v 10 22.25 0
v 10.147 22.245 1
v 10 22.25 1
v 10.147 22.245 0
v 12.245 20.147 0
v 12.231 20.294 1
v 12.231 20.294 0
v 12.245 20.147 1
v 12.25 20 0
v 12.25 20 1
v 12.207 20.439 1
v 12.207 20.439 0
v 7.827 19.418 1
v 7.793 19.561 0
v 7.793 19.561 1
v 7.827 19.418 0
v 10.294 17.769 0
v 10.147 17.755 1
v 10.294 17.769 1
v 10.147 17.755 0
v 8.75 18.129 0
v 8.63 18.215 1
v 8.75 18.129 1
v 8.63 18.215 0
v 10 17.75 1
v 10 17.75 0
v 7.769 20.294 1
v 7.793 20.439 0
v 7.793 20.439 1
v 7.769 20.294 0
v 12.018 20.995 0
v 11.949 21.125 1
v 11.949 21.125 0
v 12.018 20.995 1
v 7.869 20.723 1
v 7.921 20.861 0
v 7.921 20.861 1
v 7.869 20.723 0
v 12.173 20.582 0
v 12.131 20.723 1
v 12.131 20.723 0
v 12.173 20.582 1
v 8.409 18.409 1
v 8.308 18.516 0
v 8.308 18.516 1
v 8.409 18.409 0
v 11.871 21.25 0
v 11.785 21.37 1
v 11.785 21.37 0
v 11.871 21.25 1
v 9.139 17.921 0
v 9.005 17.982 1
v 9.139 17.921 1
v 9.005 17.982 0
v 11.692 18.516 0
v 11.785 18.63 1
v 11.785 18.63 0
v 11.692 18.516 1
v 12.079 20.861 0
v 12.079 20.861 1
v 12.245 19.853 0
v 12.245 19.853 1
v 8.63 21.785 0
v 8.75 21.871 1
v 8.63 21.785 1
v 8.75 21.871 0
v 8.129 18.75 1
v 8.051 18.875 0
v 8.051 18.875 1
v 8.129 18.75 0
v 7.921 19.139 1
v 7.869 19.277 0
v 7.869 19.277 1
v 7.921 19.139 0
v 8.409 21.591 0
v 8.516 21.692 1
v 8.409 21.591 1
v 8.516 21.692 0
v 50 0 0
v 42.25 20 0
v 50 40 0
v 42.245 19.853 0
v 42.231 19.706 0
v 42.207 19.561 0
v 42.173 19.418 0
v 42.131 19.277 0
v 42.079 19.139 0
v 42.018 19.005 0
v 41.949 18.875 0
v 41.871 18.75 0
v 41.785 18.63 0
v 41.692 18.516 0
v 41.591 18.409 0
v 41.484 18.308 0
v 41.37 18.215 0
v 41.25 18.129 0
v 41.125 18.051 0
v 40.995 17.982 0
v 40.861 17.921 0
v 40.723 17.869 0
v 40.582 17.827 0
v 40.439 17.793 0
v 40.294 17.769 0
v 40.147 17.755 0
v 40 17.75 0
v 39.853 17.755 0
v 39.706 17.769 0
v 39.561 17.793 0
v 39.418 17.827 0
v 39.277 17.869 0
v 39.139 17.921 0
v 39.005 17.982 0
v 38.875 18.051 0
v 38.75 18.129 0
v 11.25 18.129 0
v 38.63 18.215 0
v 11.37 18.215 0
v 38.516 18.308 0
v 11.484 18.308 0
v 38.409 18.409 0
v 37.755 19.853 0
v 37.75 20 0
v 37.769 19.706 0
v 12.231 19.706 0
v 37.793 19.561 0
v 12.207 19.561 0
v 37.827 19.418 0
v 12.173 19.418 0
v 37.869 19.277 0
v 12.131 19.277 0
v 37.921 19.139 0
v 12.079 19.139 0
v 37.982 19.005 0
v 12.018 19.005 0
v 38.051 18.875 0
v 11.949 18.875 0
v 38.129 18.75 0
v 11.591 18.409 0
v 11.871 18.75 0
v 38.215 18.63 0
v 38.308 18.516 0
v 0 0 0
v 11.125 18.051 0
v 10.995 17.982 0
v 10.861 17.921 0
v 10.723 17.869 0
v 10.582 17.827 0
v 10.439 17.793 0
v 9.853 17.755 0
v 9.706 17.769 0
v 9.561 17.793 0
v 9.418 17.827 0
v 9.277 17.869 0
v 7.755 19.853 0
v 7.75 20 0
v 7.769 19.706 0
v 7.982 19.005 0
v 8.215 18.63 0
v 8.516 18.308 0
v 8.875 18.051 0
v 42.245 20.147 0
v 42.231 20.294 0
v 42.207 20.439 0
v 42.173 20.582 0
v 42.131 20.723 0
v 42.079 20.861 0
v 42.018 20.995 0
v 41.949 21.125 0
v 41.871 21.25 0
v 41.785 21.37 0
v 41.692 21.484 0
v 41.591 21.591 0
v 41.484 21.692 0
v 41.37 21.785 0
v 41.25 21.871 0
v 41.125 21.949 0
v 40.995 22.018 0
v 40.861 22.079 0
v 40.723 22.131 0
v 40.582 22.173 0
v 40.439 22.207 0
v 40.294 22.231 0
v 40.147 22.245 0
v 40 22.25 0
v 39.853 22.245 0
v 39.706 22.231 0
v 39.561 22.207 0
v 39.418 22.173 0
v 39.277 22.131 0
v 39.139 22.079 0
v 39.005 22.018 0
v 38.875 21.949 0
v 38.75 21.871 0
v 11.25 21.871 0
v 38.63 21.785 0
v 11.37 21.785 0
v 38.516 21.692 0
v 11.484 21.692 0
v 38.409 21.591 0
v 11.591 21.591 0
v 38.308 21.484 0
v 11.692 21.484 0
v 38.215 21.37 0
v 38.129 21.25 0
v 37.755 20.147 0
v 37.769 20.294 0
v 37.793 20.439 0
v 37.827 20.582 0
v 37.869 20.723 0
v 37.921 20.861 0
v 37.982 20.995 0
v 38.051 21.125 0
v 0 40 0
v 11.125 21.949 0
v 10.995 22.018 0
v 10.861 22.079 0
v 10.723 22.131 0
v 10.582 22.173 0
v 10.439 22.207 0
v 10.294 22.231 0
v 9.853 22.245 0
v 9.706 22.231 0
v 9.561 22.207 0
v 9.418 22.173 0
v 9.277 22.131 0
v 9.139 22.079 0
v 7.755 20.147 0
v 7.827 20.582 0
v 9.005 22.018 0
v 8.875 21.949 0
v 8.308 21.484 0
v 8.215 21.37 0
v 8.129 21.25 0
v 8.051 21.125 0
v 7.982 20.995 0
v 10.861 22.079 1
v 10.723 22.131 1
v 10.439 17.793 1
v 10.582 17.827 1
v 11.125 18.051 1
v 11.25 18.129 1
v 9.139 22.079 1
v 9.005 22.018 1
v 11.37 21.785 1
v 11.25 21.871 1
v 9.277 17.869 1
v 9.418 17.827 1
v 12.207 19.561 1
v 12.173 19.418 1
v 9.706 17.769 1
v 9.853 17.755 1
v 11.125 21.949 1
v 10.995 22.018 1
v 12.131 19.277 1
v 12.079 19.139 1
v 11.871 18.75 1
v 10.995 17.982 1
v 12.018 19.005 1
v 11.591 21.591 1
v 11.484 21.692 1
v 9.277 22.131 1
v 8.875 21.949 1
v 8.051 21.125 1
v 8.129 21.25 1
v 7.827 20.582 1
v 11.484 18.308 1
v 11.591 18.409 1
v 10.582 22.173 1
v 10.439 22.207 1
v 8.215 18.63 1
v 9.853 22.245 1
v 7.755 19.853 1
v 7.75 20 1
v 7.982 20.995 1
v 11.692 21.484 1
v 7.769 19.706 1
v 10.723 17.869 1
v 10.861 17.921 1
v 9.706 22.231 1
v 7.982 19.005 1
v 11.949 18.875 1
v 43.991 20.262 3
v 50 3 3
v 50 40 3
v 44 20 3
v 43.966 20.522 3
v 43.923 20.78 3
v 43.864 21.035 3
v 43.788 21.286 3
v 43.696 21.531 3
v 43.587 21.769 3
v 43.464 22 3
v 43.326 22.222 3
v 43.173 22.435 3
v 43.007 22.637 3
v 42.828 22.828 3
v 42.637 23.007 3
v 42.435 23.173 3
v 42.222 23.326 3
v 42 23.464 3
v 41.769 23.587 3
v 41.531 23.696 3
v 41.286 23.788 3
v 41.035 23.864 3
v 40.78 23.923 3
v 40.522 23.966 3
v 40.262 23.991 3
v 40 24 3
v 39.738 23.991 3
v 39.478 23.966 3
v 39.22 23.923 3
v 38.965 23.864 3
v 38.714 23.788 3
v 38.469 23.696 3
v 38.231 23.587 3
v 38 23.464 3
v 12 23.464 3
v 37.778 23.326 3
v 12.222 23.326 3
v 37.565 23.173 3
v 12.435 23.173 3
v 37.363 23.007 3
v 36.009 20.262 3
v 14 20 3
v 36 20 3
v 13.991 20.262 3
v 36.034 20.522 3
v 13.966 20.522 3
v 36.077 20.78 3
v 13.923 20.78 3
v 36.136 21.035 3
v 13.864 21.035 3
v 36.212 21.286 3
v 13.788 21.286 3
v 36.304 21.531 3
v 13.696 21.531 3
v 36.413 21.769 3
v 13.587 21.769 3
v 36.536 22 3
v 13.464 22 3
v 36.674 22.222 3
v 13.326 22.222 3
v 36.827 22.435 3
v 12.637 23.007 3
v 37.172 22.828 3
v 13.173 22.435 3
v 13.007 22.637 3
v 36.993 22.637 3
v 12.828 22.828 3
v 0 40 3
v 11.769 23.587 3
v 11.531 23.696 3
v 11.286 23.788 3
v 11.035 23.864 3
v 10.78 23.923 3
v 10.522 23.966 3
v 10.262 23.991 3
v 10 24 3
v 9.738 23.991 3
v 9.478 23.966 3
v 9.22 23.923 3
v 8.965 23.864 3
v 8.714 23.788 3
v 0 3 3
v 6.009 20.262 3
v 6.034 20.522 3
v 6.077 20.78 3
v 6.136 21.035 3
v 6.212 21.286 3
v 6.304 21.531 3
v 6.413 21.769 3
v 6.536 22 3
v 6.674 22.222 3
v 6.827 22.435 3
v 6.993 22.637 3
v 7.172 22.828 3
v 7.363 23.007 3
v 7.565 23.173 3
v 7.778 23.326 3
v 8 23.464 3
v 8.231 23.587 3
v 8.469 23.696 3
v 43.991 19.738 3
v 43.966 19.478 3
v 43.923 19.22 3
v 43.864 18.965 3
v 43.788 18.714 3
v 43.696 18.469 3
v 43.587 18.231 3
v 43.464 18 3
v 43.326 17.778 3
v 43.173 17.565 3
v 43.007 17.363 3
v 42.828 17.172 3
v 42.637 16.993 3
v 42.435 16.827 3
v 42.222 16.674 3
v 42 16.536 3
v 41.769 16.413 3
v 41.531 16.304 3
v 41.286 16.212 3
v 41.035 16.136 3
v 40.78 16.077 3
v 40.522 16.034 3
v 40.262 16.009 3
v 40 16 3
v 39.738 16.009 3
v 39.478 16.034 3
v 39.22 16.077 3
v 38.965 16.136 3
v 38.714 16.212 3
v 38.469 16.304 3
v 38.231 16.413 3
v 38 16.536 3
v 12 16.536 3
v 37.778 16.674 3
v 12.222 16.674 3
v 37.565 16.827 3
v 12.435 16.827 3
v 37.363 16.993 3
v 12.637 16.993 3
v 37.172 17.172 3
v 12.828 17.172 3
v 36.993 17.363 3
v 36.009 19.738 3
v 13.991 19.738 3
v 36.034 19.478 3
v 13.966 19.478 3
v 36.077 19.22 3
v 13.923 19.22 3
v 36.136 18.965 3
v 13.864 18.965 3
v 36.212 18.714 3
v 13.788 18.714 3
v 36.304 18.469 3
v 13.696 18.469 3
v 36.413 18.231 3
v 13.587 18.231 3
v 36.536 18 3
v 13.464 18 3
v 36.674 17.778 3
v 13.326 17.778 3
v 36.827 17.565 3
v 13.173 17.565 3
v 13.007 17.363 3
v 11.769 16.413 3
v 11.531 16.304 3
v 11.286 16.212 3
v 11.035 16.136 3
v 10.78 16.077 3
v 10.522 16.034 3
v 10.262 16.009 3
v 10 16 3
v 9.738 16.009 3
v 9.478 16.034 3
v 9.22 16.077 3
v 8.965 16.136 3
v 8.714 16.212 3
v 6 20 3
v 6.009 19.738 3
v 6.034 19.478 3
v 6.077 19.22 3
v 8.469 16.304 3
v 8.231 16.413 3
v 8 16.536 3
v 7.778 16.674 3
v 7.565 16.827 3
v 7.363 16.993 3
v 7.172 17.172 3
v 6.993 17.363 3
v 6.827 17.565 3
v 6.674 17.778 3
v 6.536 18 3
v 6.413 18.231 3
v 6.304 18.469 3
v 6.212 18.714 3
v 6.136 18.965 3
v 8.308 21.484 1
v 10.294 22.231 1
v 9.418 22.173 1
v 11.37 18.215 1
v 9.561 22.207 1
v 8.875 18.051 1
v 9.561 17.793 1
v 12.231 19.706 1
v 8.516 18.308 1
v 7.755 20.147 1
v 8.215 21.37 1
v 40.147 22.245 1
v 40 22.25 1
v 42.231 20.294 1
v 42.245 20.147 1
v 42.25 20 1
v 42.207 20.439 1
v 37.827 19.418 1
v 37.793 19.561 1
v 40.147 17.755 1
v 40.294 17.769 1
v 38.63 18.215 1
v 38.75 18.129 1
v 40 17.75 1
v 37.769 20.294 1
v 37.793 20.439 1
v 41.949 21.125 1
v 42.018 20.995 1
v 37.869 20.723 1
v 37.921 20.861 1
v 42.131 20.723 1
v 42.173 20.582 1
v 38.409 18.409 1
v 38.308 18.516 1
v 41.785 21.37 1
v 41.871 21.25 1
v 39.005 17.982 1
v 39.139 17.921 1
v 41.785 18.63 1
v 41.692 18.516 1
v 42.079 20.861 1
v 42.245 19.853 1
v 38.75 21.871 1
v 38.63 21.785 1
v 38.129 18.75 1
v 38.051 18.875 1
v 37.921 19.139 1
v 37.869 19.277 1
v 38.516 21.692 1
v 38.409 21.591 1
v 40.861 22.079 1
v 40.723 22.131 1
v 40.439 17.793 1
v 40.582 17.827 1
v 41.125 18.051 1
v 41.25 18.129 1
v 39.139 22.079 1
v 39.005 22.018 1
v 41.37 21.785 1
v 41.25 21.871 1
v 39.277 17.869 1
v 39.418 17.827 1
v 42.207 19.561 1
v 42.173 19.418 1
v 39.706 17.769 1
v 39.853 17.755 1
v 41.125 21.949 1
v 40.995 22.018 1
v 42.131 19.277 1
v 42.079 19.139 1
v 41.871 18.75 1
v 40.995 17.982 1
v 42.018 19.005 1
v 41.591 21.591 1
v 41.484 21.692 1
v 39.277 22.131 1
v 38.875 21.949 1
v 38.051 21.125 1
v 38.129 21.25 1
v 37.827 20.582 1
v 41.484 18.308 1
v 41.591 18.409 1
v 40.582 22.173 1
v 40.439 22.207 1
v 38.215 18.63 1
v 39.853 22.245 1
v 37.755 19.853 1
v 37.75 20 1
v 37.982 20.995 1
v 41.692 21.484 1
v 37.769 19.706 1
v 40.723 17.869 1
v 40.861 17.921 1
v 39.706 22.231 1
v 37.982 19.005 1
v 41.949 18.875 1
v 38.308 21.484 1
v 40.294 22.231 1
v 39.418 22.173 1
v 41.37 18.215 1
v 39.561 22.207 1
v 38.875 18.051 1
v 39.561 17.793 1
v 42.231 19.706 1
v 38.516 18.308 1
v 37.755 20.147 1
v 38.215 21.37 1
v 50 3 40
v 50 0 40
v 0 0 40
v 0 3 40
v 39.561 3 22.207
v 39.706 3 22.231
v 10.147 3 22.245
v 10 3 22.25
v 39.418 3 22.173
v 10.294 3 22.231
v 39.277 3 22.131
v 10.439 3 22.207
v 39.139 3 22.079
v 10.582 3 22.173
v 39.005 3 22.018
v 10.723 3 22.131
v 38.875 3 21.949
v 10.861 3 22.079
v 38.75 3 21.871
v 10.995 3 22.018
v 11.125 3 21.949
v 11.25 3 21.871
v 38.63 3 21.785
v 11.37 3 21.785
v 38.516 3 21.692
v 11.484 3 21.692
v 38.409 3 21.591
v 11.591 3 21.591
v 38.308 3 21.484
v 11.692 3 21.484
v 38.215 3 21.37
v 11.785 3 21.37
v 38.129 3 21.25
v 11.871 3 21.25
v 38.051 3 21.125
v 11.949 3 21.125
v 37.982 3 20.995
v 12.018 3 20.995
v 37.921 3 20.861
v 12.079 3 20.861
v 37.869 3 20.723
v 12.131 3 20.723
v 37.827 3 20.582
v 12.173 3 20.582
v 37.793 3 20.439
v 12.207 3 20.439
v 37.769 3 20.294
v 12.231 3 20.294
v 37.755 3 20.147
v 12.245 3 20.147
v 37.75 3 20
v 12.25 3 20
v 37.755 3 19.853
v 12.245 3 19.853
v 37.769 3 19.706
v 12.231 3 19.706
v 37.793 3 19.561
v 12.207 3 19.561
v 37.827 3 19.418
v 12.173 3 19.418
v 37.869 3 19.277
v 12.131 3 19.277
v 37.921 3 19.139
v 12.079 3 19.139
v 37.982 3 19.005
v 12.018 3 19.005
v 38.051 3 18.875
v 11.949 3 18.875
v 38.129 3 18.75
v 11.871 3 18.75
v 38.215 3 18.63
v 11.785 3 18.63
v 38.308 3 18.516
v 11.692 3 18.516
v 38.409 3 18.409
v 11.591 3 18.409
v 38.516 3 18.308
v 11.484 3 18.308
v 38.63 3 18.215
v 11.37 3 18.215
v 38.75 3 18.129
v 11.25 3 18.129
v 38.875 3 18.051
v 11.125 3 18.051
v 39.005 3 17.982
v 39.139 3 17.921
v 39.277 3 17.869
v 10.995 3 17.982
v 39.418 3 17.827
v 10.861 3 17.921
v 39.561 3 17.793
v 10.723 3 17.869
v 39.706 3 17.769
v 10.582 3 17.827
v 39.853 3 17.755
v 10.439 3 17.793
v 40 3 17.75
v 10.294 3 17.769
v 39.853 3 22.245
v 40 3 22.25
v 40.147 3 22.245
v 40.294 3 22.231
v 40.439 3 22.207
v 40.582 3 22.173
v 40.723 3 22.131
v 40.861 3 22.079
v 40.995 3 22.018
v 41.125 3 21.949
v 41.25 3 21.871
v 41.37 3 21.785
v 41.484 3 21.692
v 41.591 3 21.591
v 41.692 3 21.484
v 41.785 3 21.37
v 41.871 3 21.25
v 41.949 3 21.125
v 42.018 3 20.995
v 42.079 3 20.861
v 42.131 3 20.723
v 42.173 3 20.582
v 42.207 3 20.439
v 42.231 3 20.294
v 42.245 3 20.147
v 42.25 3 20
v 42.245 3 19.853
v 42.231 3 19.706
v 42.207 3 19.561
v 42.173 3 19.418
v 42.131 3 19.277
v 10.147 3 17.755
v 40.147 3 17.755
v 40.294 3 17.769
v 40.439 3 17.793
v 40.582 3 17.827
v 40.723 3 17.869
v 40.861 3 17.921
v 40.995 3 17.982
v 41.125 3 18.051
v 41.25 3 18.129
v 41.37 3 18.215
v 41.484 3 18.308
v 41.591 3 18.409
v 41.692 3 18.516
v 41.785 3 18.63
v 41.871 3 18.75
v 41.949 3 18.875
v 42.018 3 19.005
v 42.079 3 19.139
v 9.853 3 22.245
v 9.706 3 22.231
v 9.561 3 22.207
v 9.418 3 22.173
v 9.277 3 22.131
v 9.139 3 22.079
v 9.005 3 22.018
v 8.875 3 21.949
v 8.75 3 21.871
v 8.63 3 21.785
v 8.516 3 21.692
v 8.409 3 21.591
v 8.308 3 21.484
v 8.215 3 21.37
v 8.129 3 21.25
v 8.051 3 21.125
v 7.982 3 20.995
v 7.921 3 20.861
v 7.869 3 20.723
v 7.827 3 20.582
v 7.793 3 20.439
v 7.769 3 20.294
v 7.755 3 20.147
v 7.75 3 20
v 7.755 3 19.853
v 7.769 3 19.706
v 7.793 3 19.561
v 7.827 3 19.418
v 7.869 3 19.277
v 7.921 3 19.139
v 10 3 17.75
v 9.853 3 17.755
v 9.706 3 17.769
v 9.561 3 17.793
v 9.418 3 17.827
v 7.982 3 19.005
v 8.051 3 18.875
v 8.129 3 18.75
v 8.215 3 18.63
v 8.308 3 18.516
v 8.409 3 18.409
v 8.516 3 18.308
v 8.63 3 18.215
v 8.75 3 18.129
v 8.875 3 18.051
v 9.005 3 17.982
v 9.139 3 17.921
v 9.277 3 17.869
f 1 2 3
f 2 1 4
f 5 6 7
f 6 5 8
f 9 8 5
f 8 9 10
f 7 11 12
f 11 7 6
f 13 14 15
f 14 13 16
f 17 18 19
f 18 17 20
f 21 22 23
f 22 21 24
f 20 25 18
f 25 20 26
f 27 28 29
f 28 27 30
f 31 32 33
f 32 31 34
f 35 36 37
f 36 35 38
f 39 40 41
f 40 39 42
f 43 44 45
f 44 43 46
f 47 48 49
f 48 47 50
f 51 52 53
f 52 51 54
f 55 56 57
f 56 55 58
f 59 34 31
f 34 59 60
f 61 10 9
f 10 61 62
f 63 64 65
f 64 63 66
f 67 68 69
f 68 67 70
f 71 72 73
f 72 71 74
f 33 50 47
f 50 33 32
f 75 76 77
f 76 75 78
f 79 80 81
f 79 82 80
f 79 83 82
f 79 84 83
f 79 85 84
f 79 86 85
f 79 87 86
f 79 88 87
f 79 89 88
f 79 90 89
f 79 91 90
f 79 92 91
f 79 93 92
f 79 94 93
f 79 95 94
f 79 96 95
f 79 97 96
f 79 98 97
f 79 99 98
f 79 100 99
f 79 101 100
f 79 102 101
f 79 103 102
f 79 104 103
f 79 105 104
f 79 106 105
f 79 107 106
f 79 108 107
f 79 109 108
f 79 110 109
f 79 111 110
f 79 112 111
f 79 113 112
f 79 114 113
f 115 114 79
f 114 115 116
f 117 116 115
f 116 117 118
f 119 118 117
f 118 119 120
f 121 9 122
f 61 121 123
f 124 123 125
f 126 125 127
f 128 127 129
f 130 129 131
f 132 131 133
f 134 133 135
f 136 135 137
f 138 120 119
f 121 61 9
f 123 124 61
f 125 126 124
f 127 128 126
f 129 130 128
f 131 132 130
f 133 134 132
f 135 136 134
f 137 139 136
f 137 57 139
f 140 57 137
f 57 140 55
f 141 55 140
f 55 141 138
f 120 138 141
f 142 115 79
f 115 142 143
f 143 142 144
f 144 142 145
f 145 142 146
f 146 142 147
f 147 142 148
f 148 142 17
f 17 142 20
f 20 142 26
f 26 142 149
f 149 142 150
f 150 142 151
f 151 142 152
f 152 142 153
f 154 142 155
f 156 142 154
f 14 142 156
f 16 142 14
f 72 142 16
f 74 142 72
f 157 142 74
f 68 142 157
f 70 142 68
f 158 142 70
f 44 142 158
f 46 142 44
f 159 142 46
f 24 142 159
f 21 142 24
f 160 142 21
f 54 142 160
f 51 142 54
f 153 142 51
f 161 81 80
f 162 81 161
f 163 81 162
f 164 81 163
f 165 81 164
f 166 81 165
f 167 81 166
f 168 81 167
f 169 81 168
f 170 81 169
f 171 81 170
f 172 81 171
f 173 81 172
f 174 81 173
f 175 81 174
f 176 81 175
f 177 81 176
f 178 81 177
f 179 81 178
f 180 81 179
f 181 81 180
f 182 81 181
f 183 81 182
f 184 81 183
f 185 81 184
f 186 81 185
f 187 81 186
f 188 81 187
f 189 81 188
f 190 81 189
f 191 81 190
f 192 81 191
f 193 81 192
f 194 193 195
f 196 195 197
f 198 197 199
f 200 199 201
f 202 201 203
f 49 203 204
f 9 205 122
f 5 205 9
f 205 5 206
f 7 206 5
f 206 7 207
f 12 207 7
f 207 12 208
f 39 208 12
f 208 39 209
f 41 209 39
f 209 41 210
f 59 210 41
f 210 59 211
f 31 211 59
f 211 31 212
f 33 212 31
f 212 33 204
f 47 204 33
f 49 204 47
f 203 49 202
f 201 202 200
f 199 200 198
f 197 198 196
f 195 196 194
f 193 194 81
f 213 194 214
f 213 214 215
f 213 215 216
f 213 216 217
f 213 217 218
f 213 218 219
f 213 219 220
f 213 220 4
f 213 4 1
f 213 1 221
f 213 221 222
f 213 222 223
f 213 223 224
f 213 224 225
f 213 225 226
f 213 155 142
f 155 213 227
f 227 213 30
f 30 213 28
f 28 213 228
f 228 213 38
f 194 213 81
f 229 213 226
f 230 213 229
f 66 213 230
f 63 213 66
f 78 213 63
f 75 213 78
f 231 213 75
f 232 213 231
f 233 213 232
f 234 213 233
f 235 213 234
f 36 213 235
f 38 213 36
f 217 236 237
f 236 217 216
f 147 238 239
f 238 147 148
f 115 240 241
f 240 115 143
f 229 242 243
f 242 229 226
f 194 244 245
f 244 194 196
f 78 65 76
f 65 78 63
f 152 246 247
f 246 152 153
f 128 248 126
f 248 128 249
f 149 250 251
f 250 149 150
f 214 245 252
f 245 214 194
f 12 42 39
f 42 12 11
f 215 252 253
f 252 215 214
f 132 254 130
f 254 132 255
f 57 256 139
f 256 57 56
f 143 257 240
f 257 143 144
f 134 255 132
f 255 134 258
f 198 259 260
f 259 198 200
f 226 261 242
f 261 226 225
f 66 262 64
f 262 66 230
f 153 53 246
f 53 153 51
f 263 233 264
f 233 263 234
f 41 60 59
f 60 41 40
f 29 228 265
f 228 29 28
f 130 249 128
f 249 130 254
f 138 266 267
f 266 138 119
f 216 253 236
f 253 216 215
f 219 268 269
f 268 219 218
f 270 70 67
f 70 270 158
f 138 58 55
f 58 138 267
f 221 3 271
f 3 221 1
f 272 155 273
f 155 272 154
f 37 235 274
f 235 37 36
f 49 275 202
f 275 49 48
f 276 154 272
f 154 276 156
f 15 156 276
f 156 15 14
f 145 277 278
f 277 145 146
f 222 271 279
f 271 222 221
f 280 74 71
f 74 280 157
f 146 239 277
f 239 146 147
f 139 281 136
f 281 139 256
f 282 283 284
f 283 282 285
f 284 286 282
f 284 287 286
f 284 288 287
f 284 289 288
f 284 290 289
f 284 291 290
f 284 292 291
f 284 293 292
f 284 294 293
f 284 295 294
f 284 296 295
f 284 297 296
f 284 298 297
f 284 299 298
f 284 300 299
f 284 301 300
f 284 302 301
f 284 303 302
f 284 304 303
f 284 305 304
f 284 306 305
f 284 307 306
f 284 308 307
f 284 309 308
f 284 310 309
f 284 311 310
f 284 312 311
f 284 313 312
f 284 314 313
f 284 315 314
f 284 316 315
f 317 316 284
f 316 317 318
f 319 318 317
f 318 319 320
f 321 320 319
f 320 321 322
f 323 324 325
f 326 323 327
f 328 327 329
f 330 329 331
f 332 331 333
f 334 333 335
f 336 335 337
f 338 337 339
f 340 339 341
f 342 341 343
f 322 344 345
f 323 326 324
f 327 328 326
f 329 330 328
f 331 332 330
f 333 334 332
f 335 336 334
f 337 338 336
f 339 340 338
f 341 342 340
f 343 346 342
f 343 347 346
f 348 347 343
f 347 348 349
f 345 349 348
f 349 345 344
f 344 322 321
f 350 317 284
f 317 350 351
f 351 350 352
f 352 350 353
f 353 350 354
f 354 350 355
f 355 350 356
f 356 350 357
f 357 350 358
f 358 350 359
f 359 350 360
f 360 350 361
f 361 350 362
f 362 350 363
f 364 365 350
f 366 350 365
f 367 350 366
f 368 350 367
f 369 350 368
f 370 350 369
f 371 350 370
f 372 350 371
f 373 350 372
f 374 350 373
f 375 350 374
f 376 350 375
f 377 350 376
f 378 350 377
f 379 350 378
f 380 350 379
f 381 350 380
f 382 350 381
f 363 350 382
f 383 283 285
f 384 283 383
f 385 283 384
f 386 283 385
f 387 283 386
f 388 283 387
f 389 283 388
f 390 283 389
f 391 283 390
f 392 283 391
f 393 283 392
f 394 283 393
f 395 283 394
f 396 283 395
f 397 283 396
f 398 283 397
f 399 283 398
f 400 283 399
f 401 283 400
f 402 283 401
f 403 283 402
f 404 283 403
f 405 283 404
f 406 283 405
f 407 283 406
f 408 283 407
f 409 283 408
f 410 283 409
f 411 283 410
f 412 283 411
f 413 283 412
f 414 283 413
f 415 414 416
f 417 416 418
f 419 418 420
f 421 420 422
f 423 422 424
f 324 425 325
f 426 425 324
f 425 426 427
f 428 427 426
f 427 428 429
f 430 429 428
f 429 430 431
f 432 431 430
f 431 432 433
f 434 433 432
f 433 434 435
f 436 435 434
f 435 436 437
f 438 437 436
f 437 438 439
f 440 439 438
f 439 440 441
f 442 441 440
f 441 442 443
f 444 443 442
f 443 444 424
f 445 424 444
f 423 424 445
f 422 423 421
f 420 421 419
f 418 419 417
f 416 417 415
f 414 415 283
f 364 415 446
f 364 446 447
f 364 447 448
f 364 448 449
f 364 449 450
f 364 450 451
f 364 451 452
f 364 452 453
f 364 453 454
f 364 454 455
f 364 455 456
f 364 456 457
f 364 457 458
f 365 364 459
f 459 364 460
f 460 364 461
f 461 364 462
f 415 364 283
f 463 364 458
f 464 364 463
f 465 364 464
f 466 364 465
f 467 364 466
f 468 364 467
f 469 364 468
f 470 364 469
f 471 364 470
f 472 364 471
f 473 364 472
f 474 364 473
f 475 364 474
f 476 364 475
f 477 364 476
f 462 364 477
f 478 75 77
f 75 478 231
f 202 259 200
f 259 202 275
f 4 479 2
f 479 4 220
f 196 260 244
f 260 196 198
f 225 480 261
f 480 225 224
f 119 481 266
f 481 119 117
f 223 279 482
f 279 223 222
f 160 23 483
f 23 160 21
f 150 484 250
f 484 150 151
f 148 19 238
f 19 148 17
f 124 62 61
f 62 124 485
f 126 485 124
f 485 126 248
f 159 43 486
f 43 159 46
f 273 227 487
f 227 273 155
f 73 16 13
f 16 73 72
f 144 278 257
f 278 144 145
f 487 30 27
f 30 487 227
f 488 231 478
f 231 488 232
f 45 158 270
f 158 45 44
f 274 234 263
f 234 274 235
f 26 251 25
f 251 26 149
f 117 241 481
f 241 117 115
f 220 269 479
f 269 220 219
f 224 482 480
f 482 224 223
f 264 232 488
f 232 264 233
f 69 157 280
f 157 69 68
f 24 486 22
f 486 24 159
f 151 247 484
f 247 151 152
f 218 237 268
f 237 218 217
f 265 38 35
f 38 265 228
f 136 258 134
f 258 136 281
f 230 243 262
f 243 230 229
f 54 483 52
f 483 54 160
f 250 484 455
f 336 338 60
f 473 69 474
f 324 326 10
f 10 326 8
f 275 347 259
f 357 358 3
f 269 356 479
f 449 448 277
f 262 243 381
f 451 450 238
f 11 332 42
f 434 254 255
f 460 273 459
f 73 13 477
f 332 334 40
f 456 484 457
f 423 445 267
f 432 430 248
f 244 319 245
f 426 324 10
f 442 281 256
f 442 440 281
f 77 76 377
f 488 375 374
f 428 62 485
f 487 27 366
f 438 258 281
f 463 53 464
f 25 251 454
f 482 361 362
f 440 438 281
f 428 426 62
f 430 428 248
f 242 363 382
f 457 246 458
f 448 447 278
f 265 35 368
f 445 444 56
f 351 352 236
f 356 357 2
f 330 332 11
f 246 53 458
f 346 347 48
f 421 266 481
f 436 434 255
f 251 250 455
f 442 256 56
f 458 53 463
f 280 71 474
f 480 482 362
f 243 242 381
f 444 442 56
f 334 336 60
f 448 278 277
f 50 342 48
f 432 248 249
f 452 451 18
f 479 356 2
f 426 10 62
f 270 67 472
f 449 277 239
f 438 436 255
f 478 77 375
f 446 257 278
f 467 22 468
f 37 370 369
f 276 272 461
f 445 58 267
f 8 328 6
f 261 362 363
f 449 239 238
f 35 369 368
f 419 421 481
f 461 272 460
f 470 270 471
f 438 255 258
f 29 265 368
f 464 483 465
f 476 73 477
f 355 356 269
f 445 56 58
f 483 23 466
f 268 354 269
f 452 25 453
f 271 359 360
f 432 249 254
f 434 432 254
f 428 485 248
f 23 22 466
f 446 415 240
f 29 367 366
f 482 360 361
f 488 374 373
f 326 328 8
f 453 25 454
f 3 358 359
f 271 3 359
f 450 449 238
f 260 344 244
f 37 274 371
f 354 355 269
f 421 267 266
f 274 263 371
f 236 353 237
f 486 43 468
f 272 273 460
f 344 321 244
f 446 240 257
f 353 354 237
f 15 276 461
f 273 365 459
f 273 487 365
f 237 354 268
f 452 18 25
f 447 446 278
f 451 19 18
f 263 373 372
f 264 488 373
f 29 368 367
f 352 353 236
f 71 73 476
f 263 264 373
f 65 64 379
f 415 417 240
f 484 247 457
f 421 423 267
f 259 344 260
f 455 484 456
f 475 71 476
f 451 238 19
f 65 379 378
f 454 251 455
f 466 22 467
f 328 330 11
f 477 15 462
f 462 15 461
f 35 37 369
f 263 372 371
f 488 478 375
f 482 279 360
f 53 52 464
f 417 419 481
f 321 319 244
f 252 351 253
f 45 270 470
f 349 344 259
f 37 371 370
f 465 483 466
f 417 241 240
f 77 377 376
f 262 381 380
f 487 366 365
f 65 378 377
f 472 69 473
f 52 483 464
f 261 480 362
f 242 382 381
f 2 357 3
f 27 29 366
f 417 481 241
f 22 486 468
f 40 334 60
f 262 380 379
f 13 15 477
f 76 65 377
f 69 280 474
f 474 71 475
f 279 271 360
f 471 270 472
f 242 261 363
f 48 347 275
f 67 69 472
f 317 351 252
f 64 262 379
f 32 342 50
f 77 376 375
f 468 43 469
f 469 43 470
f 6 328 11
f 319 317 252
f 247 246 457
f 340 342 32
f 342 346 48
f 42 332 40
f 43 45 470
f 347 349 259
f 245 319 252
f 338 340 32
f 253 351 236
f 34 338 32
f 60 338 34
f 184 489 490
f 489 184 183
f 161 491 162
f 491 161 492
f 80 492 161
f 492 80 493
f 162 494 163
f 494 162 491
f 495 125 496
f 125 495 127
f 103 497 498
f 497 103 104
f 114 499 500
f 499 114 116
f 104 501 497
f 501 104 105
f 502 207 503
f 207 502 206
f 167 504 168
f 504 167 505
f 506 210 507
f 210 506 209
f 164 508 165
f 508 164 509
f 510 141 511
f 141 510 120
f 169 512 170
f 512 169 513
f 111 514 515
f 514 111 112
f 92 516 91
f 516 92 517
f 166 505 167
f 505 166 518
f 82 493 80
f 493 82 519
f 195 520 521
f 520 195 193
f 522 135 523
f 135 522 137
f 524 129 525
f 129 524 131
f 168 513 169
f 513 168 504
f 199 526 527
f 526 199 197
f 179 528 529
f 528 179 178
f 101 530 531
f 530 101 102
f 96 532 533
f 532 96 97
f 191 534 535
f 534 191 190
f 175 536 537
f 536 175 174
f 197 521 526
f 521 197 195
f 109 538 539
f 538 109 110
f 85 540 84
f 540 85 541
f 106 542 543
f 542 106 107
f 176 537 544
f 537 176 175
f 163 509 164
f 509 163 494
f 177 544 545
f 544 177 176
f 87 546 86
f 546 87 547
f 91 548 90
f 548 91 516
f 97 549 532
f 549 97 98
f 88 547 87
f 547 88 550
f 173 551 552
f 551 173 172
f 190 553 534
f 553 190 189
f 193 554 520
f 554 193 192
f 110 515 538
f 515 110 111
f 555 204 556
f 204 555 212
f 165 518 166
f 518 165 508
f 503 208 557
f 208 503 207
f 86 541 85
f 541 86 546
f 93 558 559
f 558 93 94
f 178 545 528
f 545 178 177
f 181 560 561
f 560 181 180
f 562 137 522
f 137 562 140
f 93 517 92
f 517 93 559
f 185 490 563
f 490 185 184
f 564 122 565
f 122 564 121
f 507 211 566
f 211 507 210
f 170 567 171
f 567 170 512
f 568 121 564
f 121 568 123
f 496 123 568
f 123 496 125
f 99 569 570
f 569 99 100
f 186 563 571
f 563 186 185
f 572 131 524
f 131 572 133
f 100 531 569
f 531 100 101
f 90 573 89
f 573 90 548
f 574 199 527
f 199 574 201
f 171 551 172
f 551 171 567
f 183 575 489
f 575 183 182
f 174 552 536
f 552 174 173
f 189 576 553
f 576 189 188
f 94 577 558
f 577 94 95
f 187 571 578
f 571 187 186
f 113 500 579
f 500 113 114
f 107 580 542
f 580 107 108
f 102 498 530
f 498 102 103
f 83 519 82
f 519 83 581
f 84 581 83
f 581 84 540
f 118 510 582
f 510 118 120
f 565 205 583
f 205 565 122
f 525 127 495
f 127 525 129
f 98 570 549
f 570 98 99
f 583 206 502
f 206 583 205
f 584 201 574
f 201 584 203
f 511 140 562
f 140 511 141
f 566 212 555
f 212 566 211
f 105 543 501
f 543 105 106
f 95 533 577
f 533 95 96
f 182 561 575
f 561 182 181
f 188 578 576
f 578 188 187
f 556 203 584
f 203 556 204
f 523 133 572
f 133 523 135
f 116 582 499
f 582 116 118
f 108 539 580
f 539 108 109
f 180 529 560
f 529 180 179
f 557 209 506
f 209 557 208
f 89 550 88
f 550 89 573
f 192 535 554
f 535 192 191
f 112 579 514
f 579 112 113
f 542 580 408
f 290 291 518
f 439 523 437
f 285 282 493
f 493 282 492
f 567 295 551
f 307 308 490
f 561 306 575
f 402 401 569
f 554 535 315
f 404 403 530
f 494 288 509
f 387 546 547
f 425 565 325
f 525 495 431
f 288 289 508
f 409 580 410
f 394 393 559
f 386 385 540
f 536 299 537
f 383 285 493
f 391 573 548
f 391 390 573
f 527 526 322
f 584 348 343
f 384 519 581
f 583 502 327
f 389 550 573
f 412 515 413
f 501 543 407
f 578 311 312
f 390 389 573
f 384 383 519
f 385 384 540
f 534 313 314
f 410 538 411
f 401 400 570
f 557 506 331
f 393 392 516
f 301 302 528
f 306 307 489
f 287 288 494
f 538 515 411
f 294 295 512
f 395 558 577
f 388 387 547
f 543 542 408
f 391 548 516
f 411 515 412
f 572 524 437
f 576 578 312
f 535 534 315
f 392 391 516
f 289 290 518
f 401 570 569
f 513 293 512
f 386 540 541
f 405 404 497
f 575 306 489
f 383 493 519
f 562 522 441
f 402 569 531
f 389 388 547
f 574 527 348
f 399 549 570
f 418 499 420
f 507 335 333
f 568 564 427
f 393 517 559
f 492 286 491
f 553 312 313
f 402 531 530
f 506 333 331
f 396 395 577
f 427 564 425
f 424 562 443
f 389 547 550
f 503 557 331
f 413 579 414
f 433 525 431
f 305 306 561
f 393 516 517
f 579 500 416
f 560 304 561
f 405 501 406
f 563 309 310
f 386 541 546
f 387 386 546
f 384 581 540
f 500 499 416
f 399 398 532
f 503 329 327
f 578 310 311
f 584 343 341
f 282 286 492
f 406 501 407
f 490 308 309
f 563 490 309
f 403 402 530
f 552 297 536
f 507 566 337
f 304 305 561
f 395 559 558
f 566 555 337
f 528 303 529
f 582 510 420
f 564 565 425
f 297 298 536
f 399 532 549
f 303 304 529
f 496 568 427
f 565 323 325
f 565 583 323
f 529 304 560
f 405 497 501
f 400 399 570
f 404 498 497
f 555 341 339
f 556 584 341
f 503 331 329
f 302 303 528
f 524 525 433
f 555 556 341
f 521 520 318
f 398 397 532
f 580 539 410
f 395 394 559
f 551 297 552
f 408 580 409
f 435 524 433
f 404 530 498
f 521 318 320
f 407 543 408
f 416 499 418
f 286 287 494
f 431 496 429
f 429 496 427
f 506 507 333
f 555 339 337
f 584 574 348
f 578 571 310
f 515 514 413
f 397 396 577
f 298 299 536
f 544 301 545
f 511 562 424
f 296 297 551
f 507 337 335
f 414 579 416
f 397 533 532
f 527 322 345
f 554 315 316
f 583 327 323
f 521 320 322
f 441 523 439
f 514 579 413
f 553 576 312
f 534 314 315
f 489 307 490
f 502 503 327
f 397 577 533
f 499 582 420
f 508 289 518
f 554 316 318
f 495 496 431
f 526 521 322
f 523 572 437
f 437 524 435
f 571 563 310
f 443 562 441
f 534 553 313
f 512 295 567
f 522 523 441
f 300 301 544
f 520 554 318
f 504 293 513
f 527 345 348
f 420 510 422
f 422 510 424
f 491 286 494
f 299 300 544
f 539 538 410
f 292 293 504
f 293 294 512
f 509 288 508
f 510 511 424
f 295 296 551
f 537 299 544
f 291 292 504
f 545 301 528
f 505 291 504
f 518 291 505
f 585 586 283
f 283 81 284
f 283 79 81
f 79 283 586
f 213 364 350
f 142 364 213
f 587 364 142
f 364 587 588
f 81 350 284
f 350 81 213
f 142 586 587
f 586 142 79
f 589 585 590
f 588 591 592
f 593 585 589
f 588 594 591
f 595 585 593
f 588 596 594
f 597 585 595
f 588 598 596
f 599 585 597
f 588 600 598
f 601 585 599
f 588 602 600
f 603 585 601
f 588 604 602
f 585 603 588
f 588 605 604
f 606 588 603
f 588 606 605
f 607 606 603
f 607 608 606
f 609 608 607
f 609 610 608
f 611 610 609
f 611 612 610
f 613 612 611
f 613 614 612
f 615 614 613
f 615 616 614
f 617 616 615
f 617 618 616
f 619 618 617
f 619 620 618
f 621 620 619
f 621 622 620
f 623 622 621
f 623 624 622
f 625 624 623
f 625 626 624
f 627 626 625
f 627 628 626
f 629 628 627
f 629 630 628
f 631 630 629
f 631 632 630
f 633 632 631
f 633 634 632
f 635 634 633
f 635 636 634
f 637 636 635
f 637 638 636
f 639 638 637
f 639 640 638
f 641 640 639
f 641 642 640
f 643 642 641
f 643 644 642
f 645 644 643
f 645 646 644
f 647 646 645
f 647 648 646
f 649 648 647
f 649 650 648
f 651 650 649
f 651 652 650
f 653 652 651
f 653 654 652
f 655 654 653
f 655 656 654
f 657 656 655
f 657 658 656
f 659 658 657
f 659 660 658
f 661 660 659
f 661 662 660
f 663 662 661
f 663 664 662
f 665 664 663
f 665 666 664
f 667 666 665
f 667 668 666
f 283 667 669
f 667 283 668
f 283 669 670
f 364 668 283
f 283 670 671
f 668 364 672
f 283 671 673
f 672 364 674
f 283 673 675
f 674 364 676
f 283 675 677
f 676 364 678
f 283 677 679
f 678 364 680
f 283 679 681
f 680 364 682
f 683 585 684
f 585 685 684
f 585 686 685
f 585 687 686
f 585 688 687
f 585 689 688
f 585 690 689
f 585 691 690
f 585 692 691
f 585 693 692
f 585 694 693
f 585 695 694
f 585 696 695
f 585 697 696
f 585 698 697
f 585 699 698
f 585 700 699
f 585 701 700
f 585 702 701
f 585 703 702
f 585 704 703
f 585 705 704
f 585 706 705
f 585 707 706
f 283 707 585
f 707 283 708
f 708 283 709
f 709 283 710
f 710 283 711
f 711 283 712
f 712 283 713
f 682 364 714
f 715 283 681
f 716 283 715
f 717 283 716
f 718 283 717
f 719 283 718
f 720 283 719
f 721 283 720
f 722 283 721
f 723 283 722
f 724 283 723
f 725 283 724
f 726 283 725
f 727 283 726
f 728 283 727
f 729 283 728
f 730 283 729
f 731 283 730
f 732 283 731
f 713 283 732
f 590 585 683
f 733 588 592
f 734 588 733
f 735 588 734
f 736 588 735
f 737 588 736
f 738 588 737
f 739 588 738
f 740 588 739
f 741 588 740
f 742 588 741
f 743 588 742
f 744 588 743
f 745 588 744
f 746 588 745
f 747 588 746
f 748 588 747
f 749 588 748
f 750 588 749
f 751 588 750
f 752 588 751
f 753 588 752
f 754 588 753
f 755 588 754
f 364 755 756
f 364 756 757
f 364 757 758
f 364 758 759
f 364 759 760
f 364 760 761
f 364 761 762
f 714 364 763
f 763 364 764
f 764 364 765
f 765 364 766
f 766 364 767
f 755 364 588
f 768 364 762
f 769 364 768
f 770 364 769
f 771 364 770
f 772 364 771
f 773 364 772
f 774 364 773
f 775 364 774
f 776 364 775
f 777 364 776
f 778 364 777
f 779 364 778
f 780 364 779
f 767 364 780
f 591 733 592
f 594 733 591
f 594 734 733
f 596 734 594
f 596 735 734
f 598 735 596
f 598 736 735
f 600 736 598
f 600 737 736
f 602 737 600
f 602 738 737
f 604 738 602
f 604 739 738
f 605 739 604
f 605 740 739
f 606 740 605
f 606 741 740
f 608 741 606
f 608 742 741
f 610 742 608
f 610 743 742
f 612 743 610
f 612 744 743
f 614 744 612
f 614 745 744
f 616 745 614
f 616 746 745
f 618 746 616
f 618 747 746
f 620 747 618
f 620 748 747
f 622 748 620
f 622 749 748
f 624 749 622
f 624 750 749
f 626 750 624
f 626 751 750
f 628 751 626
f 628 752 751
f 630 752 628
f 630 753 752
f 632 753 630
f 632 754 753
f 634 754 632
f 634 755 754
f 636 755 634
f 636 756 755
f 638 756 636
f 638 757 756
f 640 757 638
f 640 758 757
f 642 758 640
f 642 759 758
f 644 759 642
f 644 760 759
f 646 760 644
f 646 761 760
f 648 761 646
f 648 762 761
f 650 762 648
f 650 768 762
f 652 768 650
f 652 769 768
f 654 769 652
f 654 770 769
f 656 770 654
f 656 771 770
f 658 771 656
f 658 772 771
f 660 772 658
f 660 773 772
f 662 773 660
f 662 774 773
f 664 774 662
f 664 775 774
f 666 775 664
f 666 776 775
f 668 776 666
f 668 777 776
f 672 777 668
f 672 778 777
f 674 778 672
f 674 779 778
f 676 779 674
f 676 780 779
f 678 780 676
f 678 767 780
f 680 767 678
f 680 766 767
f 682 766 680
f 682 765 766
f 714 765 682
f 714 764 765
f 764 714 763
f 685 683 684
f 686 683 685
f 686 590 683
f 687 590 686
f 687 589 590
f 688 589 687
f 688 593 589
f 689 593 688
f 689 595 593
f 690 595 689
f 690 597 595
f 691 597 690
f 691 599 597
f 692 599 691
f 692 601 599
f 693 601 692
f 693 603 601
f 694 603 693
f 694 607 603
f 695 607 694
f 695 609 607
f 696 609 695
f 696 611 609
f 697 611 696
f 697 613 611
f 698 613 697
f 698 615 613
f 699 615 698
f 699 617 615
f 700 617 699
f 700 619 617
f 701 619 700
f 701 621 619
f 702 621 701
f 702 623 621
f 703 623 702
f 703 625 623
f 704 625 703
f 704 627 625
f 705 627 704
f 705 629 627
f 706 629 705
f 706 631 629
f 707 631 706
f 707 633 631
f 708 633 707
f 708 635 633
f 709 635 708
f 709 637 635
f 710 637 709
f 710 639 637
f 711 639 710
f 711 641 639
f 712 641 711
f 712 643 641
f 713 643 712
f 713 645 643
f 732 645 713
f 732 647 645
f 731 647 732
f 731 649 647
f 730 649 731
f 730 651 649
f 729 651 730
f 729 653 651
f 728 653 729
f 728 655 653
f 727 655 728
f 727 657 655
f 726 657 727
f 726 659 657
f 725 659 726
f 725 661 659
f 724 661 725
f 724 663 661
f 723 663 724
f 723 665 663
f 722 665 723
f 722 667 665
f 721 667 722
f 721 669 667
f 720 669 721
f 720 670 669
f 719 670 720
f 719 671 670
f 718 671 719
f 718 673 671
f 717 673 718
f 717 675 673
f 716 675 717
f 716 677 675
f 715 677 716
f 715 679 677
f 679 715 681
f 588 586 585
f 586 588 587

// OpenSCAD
$fn = 96;

// Dimensions
w = 50;      // flange width (X)
d = 40;      // horizontal flange depth (Y)
h = 40;      // vertical flange height (Z)
t = 3;       // plate thickness

// Hole parameters
through_d = 4.5;
csk_d = 8;
csk_depth = 2;
inset = 10;

// Countersunk through-hole along +Z, countersink on the +Z side
module csk_hole_z(hole_h) {
    union() {
        cylinder(h = hole_h, d = through_d);
        translate([0, 0, hole_h - csk_depth])
            cylinder(h = csk_depth, d1 = through_d, d2 = csk_d);
    }
}

// Countersunk through-hole along +Y, countersink on the +Y side
module csk_hole_y(hole_h) {
    rotate([-90, 0, 0])
        csk_hole_z(hole_h);
}

// Horizontal flange: lies in XY plane, thickness in Z
module horizontal_flange() {
    difference() {
        cube([w, d, t], center = false);

        for (x = [inset, w - inset]) {
            translate([x, d/2, 0])
                csk_hole_z(t);
        }
    }
}

// Vertical flange: lies in XZ plane, thickness in Y
module vertical_flange() {
    difference() {
        cube([w, t, h], center = false);

        for (x = [inset, w - inset]) {
            translate([x, t, h/2])
                csk_hole_y(t);
        }
    }
}

union() {
    horizontal_flange();
    vertical_flange();
}
